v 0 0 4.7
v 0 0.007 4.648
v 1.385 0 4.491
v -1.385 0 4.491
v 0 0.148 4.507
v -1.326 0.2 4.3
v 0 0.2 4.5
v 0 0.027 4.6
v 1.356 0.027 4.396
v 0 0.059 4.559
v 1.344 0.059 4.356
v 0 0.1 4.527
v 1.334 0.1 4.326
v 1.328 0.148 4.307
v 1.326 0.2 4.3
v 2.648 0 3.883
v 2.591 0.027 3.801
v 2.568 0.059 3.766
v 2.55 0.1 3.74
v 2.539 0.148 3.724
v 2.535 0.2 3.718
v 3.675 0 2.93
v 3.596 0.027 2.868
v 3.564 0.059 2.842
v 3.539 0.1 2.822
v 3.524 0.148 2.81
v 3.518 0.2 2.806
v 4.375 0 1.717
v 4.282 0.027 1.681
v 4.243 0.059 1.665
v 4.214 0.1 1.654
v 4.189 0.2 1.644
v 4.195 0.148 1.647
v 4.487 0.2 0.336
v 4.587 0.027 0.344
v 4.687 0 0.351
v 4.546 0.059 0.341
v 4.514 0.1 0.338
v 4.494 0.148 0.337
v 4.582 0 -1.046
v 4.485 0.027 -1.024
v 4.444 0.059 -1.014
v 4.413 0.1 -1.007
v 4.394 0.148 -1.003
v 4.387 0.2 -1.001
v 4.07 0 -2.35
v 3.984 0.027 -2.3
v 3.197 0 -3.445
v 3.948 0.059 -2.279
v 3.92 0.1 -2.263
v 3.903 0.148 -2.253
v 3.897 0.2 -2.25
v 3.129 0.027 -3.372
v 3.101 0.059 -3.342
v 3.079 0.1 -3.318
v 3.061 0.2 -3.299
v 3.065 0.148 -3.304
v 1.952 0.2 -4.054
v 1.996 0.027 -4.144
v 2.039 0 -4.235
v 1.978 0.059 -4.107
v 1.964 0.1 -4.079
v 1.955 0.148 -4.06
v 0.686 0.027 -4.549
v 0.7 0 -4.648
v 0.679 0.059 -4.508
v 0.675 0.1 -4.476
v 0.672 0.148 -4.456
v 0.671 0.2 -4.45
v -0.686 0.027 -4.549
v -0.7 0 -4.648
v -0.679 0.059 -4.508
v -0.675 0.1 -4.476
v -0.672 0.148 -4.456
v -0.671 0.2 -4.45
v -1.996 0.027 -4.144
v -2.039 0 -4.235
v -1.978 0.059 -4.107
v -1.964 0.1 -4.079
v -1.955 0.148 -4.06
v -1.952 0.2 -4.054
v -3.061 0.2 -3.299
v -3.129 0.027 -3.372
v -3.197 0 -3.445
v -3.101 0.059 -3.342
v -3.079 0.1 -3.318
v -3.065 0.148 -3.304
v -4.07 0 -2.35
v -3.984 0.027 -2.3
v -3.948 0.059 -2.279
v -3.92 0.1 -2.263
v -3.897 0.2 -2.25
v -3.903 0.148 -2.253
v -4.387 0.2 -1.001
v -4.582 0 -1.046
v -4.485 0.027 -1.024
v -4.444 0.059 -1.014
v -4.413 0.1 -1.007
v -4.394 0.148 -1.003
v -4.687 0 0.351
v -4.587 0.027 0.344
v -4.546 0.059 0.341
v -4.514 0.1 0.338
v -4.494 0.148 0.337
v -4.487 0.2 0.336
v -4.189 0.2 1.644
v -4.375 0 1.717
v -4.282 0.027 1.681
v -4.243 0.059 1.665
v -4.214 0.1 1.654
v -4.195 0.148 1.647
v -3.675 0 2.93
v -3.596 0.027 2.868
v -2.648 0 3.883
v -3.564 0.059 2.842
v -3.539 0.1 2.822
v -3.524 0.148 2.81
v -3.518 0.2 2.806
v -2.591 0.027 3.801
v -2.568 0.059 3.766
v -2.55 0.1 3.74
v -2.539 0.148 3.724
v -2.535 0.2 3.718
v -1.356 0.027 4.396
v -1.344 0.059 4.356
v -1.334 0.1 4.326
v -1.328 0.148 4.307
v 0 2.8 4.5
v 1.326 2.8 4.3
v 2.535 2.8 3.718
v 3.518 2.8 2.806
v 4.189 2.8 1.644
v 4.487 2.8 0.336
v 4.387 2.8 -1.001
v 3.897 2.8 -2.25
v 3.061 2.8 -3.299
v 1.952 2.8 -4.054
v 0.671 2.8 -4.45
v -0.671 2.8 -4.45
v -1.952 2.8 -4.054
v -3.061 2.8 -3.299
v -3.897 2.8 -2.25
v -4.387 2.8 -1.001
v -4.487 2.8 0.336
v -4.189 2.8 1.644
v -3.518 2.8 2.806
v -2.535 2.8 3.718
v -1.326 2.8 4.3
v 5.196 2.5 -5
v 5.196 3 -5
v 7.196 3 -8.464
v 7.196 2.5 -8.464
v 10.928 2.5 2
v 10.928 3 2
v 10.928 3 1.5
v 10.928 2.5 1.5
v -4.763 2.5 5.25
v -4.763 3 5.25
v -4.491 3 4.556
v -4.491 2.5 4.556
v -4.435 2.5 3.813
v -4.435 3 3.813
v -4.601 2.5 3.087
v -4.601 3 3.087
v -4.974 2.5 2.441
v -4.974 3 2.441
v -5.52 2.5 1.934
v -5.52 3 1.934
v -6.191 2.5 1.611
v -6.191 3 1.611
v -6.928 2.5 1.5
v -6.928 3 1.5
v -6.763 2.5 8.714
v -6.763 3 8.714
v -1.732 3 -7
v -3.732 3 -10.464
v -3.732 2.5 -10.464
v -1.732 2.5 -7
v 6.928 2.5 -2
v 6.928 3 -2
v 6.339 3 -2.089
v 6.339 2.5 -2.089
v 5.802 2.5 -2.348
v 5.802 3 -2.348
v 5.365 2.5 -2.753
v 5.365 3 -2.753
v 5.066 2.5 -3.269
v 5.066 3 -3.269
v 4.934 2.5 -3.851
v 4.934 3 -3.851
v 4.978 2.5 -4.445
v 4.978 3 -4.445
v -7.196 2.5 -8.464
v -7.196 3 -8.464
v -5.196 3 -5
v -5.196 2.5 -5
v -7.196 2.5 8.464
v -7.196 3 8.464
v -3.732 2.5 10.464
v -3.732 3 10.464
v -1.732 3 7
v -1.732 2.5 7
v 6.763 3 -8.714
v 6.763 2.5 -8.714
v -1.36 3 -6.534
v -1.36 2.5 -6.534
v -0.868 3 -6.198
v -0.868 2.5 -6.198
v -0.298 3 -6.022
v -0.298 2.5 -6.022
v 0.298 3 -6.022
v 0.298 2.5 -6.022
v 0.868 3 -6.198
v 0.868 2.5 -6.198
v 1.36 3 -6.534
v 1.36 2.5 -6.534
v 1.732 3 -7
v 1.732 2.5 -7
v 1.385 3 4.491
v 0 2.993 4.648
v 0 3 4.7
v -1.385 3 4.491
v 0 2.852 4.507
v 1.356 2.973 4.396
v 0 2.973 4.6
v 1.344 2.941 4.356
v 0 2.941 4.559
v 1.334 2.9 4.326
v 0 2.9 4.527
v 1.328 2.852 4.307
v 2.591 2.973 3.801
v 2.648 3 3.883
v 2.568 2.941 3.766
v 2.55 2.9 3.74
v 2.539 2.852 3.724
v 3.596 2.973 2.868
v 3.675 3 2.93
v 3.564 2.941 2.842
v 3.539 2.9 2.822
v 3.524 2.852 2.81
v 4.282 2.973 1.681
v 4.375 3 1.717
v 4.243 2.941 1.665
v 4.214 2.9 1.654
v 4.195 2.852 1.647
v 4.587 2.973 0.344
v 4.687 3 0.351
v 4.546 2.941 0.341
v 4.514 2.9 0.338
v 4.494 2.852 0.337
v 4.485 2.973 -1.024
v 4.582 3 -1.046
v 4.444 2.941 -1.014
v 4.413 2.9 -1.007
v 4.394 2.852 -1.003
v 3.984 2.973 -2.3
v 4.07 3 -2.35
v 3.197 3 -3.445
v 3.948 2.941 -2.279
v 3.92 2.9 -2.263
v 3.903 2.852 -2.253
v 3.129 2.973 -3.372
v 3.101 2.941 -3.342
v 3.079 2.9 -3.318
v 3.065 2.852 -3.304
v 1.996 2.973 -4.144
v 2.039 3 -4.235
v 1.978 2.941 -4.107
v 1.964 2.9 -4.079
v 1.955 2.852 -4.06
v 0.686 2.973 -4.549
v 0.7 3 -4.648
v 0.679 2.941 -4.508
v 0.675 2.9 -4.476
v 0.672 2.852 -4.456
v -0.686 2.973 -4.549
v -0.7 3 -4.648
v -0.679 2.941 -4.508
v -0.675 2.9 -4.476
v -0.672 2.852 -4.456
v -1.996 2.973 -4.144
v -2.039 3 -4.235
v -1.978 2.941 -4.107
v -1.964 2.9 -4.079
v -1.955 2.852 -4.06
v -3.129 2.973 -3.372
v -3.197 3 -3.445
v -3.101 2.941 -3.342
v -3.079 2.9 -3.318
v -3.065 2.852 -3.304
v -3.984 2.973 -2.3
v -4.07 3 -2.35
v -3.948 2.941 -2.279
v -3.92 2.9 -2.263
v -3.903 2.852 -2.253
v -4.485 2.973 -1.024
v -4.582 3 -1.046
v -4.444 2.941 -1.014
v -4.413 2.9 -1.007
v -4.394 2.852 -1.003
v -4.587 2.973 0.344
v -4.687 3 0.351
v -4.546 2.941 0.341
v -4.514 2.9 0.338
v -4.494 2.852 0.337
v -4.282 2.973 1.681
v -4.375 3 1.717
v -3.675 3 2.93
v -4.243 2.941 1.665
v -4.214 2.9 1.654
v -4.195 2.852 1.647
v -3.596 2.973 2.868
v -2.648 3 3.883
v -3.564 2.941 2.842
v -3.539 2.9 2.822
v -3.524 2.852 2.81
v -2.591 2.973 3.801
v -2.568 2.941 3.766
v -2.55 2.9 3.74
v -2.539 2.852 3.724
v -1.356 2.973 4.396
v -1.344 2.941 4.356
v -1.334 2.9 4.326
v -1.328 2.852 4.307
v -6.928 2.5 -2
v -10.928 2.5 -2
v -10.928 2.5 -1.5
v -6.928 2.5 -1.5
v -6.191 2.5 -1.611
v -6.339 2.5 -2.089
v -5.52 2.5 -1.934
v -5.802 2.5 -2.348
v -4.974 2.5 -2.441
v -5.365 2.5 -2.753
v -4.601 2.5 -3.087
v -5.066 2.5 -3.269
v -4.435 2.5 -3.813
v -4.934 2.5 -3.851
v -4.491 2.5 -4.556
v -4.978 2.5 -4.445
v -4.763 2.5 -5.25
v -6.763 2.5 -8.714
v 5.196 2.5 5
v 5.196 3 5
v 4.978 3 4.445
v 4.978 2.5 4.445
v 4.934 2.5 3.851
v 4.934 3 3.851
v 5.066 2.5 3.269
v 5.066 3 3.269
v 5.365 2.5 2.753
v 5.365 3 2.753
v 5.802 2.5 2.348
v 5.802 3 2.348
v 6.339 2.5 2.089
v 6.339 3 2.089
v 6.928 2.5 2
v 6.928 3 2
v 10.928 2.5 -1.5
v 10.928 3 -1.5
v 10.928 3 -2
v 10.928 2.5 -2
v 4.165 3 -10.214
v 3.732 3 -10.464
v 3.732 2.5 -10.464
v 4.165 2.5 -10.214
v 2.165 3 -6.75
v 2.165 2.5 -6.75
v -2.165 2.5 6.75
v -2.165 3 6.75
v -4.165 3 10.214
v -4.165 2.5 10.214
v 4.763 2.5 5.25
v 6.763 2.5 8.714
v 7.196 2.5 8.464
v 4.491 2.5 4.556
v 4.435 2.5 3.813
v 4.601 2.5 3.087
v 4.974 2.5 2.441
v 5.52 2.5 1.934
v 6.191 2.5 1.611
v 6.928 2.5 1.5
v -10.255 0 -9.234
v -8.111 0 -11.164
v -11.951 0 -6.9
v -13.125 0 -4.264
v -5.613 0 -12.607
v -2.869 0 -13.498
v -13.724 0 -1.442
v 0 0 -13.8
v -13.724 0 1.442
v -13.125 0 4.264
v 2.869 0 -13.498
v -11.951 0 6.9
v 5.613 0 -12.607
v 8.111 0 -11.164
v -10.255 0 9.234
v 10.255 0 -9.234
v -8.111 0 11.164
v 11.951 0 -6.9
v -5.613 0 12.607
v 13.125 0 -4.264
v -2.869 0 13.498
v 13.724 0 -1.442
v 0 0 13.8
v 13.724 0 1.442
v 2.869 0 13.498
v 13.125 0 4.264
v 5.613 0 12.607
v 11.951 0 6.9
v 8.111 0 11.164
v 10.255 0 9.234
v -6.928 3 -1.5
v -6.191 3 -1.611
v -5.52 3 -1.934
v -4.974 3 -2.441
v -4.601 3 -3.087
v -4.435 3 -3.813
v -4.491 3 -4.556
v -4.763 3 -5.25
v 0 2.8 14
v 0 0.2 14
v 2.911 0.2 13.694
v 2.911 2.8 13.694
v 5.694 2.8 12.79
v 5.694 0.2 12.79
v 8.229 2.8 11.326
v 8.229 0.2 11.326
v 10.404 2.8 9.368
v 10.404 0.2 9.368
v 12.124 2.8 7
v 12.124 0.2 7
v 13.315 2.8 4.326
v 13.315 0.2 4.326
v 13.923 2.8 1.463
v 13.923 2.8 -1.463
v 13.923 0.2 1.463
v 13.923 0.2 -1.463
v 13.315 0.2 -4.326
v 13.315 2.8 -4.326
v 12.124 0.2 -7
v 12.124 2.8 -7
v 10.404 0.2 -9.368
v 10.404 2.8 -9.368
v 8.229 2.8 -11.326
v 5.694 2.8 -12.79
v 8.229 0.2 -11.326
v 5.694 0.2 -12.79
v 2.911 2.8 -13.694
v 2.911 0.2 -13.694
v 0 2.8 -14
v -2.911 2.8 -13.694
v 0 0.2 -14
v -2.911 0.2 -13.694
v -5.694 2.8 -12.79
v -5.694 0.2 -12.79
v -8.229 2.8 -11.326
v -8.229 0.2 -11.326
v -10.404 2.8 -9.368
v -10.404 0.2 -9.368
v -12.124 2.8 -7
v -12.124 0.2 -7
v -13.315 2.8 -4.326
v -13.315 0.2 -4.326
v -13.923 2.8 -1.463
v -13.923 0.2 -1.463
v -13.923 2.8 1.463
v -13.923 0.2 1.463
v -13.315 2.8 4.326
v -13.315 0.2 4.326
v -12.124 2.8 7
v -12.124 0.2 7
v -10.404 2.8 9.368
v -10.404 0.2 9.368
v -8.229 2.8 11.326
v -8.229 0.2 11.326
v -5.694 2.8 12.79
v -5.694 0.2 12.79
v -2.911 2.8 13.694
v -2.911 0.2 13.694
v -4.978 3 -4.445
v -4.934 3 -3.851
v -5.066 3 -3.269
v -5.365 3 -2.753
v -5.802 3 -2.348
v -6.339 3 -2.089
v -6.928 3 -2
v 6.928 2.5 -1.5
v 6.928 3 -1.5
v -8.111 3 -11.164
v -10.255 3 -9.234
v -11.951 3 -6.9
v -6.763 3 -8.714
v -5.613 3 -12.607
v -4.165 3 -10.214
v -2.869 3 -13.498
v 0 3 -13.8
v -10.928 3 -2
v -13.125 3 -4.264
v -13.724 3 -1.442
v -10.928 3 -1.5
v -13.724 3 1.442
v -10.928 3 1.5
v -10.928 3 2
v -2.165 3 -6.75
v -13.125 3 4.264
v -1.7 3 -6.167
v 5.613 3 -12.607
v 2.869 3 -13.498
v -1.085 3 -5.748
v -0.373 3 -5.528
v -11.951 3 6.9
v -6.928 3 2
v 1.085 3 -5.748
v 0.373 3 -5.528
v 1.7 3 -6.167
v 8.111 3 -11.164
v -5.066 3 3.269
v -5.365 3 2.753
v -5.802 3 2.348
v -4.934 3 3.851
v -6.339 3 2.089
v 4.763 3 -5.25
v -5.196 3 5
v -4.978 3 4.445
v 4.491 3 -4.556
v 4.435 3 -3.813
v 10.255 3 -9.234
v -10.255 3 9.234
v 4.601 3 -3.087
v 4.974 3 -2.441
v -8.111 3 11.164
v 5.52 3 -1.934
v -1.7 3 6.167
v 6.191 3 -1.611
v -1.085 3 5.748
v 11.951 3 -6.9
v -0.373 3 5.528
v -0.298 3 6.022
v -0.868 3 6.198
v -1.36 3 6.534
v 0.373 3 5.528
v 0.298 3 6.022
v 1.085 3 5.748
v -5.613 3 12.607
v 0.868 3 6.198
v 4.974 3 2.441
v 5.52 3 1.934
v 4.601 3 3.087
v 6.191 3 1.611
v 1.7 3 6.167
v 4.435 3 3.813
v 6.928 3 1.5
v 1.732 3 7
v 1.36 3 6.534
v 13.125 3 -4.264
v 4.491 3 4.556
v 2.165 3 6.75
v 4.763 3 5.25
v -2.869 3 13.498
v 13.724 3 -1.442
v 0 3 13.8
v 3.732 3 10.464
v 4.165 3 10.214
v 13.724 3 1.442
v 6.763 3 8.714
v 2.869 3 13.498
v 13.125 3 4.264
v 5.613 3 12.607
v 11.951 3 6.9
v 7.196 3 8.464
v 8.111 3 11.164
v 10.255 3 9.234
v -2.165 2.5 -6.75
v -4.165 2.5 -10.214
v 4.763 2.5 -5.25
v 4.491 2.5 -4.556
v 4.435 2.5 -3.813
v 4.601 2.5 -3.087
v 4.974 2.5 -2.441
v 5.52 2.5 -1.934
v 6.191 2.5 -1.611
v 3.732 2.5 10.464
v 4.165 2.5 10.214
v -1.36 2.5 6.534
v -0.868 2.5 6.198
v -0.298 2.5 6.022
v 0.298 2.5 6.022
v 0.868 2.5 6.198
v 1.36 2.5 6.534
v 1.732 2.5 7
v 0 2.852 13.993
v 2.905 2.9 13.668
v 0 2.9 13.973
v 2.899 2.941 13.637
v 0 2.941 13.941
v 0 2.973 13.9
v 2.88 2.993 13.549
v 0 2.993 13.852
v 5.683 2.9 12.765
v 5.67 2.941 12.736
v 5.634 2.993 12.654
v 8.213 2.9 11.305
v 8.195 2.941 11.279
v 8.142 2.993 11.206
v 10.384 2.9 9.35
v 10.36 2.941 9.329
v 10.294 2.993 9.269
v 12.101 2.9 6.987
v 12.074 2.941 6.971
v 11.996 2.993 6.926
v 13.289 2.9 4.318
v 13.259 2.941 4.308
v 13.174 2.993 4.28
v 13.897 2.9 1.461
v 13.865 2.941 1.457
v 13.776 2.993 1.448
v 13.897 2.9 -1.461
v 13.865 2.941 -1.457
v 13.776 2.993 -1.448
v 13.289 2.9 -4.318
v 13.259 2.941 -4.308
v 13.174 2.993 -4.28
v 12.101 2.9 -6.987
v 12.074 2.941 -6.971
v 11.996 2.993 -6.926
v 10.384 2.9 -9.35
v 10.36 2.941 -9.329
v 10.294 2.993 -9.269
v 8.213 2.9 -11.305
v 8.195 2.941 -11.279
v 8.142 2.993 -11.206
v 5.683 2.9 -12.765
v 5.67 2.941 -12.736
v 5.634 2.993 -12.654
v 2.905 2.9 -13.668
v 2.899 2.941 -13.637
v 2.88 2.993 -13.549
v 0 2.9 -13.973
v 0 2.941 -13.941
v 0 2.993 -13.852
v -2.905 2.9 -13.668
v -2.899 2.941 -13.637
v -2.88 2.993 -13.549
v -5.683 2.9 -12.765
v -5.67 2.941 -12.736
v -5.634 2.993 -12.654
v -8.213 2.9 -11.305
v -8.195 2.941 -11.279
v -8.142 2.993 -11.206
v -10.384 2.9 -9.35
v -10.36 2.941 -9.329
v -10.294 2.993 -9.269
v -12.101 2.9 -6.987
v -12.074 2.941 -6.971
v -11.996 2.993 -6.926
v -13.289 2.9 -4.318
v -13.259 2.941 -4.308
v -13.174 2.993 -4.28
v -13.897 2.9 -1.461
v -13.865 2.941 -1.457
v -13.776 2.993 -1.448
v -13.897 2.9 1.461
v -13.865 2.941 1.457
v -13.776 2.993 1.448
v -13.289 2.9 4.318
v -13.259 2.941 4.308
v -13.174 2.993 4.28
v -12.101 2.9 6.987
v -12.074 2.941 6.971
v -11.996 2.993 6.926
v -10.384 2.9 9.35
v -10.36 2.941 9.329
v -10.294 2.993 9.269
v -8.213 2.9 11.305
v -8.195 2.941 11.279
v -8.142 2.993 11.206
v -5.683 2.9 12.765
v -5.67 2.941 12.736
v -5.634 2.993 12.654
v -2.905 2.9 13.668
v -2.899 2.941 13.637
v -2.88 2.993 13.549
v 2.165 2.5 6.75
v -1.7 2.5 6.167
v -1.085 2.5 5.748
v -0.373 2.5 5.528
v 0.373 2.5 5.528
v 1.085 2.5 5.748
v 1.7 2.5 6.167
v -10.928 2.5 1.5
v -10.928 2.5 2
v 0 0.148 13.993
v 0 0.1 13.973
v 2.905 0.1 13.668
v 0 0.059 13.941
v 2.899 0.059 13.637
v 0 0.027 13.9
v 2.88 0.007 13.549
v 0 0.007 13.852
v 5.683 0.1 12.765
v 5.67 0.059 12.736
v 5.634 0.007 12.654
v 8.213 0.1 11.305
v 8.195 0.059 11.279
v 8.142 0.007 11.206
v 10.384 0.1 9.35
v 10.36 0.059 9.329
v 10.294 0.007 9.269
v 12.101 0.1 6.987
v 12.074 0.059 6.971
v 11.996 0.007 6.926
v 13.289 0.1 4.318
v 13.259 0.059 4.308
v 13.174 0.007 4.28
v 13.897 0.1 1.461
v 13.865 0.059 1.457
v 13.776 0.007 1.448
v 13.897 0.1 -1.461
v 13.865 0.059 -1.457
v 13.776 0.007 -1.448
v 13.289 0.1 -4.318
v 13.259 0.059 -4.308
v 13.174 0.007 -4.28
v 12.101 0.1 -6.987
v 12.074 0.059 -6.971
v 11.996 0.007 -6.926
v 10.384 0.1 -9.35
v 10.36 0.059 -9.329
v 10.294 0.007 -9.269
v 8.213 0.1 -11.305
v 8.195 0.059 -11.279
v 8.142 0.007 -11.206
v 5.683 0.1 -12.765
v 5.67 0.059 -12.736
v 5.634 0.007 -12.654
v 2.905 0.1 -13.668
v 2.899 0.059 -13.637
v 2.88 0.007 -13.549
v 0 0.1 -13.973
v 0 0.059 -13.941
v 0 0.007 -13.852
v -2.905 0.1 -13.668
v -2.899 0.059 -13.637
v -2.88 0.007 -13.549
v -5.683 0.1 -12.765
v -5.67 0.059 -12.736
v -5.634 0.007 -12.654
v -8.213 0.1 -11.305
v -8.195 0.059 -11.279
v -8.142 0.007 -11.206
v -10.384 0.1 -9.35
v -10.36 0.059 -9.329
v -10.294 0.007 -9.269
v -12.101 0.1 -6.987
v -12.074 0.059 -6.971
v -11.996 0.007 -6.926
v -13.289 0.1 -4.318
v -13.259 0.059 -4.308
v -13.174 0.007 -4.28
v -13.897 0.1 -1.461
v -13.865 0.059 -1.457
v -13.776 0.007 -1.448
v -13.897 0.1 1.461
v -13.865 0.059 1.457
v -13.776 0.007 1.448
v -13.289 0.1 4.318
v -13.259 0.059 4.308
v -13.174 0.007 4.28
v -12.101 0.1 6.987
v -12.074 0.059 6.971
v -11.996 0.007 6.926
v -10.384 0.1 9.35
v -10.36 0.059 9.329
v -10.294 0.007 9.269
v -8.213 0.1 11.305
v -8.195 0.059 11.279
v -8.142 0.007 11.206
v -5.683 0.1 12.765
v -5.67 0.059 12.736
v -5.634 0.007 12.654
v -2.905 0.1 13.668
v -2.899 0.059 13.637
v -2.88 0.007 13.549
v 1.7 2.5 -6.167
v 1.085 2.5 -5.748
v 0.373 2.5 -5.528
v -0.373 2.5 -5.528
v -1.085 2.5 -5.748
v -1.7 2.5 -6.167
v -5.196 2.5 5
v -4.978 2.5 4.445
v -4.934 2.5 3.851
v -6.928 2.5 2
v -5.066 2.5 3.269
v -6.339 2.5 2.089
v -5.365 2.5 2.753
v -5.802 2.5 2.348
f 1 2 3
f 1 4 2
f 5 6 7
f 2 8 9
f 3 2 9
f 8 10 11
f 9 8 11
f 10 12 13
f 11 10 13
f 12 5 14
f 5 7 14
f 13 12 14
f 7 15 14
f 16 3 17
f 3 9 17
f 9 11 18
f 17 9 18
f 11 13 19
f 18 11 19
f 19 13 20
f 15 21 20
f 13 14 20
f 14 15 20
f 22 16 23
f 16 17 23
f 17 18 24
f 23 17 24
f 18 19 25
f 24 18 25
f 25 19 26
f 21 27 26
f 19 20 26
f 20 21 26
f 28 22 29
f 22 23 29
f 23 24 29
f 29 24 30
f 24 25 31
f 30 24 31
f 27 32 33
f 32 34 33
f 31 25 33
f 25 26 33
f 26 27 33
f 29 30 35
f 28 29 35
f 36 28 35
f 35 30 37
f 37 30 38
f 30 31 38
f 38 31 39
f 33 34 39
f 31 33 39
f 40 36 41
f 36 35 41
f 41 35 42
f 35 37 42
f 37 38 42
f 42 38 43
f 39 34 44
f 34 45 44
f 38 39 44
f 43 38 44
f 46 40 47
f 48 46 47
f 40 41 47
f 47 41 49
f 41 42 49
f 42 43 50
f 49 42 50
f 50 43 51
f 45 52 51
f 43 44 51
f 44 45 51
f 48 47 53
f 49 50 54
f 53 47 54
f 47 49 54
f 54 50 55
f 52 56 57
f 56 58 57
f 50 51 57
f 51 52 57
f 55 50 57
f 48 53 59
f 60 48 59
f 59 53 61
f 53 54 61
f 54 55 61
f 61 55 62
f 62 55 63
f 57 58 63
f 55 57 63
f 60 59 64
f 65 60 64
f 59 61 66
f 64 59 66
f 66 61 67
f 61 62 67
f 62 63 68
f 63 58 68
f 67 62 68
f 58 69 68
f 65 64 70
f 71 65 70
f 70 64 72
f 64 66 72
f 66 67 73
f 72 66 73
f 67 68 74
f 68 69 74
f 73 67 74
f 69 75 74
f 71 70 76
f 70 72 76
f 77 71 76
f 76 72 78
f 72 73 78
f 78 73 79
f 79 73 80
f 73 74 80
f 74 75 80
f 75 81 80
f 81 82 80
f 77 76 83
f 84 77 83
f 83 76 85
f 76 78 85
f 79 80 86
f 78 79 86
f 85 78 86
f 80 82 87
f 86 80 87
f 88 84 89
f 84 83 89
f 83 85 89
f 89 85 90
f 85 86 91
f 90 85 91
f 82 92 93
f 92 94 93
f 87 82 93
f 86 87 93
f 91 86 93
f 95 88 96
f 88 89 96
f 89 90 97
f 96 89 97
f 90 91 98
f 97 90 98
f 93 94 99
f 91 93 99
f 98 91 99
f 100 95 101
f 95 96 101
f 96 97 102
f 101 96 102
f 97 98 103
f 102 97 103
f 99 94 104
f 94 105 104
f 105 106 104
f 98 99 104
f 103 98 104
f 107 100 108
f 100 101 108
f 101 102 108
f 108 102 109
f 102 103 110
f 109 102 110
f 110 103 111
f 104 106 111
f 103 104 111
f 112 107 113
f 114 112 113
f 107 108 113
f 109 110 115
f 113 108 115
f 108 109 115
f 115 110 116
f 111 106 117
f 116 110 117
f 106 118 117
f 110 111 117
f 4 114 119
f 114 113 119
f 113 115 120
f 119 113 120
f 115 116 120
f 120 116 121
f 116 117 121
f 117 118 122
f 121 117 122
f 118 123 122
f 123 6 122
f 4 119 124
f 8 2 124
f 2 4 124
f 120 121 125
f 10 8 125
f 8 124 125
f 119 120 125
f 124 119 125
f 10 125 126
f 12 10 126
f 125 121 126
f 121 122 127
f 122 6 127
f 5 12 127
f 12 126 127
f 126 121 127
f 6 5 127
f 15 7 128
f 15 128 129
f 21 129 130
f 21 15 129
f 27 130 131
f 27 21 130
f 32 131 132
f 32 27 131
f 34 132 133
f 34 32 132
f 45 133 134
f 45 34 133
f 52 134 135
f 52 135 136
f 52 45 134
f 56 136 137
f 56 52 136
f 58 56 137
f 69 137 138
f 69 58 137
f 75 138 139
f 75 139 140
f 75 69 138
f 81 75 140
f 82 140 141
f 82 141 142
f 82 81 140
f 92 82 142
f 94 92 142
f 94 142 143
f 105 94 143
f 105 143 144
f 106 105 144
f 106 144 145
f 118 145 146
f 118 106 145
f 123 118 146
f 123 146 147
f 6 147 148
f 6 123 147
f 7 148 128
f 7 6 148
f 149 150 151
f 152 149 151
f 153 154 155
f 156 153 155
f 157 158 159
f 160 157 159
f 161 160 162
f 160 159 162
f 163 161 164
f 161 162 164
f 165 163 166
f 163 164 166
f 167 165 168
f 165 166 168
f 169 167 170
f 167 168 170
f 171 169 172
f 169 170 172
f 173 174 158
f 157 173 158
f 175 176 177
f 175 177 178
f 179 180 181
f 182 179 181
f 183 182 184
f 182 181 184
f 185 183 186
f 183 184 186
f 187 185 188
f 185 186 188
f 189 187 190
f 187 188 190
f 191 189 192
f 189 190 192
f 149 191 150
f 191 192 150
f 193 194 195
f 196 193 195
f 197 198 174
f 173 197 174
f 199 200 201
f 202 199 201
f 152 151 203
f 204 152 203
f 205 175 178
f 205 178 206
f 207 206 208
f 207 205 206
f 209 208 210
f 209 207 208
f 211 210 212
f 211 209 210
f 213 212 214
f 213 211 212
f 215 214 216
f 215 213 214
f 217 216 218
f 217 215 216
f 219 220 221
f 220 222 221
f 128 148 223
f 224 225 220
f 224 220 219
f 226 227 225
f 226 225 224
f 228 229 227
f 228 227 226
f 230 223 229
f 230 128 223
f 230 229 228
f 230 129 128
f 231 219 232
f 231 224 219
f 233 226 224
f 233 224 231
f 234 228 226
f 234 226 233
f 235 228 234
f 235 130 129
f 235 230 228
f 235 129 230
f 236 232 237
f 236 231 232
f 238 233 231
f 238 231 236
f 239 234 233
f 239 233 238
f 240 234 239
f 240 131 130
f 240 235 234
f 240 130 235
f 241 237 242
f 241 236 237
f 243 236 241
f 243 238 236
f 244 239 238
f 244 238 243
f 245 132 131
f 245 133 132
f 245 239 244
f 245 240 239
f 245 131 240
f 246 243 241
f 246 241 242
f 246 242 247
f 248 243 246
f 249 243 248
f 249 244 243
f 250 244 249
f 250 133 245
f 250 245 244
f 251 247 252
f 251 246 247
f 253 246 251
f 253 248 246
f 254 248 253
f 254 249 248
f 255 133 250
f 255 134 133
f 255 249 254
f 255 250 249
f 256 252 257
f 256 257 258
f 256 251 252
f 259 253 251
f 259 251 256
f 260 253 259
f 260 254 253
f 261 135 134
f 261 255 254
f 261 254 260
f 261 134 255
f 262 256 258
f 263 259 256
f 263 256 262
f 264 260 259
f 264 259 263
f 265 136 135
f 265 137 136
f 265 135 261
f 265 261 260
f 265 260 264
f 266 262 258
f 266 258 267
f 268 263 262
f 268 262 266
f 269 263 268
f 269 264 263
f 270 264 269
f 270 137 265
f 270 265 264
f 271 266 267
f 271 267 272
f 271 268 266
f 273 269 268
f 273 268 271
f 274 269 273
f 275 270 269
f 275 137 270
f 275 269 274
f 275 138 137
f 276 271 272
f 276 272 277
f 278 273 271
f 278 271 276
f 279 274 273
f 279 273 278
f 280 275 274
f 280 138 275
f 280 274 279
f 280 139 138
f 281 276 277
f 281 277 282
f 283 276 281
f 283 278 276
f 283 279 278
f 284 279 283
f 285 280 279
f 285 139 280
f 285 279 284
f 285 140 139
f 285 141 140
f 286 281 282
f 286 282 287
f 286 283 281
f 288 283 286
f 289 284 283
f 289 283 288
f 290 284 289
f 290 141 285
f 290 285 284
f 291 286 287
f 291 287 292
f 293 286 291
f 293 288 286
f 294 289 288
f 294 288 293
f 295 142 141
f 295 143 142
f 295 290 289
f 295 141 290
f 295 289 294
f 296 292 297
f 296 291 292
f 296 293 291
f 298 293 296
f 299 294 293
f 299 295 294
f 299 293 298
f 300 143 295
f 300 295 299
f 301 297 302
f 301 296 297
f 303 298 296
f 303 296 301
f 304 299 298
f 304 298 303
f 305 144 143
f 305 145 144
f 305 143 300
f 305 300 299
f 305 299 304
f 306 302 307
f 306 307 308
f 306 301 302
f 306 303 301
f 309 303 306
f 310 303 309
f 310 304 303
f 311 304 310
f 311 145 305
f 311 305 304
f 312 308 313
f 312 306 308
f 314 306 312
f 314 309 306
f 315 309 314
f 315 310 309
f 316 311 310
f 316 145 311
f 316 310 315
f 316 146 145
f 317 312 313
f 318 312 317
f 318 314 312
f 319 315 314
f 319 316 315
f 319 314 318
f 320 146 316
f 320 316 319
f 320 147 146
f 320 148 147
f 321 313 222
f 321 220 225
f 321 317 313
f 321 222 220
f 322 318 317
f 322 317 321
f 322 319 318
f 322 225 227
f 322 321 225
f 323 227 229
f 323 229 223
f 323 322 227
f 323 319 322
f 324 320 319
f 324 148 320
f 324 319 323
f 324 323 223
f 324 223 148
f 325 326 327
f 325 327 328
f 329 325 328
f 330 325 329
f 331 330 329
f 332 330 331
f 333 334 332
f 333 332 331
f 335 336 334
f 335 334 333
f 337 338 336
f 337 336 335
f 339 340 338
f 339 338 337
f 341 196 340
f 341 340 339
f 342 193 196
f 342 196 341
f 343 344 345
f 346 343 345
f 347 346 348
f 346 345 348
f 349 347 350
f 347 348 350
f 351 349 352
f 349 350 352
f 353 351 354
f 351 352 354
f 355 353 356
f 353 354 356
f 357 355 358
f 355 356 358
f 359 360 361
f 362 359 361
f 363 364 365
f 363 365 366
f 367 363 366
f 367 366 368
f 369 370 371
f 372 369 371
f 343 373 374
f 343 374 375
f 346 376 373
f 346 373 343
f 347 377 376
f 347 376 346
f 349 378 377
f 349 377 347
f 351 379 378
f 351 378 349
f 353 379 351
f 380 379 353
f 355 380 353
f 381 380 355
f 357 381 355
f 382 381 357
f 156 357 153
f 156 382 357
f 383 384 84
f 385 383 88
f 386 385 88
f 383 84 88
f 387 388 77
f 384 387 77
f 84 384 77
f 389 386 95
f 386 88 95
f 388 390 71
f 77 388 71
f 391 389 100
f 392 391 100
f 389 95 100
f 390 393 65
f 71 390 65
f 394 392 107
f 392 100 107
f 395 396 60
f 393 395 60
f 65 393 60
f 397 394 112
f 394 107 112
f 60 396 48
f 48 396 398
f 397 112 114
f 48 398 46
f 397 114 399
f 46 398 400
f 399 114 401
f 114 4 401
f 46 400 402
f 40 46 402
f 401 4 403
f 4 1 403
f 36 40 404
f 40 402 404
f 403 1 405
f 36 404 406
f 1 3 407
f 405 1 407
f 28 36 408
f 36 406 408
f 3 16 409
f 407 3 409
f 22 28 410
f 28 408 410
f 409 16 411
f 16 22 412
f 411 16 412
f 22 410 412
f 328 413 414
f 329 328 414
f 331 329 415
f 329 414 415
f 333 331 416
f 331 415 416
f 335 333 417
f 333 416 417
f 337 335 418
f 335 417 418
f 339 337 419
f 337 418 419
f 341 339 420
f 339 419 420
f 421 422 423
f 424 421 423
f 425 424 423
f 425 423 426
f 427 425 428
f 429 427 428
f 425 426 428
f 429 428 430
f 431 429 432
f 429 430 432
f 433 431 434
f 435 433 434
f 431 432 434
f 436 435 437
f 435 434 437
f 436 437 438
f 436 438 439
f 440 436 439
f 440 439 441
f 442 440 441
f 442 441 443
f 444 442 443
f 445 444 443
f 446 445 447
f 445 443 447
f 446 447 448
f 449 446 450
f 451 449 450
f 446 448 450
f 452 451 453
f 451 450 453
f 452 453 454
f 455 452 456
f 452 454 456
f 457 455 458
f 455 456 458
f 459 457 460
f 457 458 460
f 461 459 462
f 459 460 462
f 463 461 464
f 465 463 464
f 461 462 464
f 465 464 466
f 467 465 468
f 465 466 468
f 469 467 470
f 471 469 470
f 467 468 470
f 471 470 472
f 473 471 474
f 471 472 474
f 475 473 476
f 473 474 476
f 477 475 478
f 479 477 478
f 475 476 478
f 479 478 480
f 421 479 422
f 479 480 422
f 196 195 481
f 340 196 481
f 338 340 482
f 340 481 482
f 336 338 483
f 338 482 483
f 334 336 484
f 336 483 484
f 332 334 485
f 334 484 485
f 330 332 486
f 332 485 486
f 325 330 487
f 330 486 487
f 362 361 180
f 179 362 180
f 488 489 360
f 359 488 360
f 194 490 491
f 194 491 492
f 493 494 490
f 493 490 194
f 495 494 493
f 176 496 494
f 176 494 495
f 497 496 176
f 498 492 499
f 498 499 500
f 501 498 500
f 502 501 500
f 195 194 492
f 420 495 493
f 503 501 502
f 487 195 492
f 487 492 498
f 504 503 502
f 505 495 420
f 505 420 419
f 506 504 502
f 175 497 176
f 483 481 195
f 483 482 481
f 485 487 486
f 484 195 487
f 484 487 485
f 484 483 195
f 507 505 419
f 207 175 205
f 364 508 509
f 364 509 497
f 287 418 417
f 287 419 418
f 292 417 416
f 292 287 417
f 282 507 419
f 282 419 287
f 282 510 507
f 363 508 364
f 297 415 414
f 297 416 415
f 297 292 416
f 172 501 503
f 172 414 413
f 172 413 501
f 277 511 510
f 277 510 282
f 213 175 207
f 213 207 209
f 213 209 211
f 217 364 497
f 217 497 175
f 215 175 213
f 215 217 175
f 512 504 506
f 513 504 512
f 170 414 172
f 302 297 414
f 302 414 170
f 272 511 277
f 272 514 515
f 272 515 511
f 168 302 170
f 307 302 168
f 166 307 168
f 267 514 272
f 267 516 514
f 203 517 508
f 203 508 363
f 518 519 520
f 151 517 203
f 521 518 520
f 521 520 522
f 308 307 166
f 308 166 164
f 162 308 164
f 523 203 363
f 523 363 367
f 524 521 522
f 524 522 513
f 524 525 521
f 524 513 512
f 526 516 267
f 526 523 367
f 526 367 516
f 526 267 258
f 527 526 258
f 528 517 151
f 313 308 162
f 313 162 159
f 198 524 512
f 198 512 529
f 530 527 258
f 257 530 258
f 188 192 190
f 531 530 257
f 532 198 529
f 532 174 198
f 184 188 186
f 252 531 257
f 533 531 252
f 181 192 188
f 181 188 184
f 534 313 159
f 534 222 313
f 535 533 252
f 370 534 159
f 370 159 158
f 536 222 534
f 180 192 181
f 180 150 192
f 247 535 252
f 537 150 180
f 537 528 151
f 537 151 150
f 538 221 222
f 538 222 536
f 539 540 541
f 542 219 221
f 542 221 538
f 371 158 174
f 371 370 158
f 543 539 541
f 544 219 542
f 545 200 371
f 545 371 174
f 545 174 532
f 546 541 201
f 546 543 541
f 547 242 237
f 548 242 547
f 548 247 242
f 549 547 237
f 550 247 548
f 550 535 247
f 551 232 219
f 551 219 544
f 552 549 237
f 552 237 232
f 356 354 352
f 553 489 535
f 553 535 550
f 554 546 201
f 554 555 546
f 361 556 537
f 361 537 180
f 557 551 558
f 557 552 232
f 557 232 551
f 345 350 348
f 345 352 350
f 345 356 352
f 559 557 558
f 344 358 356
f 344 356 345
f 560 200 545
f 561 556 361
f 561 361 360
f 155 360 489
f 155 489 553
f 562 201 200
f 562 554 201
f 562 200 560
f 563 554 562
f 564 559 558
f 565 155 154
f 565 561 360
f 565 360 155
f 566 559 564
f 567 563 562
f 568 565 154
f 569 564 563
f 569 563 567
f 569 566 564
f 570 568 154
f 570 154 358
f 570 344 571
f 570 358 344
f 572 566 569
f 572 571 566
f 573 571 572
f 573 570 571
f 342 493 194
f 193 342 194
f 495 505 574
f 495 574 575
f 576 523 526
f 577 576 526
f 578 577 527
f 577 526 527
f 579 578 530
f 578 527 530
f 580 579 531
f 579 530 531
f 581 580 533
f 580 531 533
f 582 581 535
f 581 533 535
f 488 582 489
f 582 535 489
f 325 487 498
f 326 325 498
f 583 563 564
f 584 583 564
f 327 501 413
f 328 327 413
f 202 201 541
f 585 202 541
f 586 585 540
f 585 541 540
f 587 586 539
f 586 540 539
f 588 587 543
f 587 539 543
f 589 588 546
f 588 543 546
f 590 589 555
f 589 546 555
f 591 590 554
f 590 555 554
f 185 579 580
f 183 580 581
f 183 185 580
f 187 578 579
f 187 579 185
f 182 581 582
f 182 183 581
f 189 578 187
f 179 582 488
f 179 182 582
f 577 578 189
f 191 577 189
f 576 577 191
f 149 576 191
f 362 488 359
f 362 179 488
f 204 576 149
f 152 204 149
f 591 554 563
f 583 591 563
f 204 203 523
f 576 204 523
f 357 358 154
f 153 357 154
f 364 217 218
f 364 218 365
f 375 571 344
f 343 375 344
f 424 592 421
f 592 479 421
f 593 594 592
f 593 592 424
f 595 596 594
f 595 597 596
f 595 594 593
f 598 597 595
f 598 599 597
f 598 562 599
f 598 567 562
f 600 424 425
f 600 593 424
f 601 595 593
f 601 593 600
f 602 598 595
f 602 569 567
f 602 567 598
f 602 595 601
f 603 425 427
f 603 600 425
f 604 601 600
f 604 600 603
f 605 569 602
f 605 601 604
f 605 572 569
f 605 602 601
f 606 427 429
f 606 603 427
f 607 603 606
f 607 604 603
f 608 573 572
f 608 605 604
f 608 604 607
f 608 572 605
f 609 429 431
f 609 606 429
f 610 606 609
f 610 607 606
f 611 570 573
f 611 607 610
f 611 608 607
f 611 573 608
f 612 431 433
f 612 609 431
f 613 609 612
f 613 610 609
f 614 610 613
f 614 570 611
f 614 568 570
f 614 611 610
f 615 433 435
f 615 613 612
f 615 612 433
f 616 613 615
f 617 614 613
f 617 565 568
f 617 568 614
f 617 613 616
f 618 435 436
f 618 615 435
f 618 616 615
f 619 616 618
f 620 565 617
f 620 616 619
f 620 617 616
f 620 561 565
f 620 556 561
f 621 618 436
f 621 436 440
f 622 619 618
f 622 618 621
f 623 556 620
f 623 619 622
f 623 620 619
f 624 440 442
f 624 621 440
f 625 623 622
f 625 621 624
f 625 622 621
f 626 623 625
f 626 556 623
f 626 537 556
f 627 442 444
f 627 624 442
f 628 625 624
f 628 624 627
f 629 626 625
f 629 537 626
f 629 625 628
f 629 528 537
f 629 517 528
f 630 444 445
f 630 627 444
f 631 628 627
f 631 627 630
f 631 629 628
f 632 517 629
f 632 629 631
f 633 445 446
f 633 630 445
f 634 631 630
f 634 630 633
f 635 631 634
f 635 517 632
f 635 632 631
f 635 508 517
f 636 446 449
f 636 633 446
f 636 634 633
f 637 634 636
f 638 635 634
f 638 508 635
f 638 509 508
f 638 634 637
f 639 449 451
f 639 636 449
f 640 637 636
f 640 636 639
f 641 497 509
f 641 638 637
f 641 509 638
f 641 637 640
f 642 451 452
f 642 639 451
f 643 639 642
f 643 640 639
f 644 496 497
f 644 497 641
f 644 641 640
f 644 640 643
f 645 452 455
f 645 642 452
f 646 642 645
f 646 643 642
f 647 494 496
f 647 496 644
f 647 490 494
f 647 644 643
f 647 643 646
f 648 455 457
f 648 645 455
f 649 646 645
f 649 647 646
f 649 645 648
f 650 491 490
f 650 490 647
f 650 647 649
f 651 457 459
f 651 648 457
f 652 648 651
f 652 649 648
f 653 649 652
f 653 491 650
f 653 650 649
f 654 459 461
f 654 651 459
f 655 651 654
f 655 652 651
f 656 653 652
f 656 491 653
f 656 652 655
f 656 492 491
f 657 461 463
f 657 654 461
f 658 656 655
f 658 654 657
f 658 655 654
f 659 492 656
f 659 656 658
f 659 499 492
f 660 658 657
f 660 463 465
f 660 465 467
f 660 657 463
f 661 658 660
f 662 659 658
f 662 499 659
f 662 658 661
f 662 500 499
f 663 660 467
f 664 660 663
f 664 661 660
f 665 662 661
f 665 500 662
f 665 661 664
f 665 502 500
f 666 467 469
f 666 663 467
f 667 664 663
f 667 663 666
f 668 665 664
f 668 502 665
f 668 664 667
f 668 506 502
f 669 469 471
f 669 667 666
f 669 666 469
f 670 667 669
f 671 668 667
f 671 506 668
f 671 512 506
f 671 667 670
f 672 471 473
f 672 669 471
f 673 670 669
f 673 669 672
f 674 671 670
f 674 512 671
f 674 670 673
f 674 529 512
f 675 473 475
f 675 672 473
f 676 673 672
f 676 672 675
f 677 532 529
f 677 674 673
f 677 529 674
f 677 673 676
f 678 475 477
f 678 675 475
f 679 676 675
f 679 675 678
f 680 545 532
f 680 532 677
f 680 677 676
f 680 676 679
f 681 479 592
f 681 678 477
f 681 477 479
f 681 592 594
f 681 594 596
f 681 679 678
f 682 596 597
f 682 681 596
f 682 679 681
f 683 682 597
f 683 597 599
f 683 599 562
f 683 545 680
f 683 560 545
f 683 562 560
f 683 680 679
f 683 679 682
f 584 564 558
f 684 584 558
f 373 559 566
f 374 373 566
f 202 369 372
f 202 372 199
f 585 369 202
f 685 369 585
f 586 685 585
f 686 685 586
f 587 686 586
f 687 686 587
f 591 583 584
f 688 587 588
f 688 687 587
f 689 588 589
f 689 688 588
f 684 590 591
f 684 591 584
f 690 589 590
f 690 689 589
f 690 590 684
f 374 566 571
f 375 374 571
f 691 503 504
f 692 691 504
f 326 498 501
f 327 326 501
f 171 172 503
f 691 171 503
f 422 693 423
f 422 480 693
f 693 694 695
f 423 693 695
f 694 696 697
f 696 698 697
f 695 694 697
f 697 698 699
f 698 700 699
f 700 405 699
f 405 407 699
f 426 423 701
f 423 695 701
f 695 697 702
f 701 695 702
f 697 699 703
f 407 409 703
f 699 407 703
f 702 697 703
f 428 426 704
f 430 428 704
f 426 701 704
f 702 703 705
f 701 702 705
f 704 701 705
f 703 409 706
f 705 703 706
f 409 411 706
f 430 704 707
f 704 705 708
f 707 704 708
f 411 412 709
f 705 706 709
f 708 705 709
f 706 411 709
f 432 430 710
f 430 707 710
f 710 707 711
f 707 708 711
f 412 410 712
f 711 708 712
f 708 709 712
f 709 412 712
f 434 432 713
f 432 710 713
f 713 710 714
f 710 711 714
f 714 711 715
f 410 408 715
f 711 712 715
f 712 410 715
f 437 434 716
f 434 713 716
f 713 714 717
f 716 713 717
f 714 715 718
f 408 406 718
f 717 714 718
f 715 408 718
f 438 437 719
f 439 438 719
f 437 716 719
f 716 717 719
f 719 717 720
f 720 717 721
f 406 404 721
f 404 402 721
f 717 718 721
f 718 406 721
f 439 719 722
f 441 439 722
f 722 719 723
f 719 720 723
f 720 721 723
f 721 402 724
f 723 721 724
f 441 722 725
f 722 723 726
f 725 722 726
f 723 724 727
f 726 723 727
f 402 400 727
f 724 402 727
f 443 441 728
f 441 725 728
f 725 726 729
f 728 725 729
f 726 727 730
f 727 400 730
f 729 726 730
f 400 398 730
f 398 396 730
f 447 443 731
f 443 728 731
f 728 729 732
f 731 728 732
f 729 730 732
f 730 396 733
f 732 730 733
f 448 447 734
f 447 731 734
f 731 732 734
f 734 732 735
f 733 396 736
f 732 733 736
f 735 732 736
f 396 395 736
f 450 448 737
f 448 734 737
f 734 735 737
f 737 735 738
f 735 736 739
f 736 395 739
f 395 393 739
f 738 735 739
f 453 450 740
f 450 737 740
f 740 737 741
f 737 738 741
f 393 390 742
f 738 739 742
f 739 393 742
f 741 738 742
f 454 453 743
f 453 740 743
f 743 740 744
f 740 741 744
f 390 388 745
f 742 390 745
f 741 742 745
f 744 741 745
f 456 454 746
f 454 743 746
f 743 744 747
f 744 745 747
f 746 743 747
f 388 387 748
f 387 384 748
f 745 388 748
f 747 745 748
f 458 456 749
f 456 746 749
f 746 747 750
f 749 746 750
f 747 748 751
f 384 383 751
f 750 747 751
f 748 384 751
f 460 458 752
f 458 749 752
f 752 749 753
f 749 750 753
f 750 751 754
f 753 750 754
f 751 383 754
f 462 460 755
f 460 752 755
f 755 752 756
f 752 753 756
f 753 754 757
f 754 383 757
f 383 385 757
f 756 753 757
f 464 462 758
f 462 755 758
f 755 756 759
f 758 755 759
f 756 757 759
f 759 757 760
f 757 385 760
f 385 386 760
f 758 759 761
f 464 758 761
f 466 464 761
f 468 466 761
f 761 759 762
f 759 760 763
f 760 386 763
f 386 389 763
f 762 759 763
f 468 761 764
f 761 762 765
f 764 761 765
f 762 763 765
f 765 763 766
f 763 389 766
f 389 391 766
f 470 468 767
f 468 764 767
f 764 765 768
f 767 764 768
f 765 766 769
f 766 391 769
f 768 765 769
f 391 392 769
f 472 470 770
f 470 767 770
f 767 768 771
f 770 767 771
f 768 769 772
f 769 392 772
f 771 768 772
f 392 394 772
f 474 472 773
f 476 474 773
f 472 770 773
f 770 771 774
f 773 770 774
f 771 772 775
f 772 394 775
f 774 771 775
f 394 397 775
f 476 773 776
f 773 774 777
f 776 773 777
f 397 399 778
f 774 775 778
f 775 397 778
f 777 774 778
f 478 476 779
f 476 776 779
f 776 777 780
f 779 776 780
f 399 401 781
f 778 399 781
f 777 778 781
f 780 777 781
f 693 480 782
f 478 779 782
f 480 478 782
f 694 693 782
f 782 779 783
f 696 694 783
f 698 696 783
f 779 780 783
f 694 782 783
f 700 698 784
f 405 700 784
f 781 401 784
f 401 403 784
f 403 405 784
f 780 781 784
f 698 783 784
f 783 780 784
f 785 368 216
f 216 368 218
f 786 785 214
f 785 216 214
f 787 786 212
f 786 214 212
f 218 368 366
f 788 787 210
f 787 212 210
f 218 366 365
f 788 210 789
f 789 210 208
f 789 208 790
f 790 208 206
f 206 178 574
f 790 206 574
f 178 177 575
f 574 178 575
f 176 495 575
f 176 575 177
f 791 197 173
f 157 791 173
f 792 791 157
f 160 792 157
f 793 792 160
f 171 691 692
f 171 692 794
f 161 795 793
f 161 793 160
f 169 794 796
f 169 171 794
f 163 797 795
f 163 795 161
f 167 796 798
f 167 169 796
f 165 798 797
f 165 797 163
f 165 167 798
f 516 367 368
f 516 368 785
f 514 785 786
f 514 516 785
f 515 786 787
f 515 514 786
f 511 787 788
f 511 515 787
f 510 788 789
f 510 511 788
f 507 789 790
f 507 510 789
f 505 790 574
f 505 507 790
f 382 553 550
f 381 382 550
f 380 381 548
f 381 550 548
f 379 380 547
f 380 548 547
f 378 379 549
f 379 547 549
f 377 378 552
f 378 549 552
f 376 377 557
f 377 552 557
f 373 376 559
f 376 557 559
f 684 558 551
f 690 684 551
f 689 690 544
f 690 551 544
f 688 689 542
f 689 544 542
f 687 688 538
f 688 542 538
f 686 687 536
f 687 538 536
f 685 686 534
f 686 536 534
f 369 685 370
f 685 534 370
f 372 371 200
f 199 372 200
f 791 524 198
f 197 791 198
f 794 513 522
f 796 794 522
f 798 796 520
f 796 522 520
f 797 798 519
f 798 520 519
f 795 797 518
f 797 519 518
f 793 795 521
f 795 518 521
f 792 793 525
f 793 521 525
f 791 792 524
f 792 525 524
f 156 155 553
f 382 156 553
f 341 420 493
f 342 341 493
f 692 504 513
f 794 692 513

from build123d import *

# Parameters (mm, degrees)
SKETCH1_R           = 14
SKETCH1_R_2         = 4.5
BOSS_EXTRUDE1_DEPTH = 3
CUT_EXTRUDE1_DEPTH  = 0.5
FILLET1_R           = 0.2


with BuildPart() as part:
    # Sketch1 → Boss-Extrude1 (new body)
    with BuildSketch(Plane(origin=(0, 0, 0), x_dir=(1, 0, 0), z_dir=(0, 1, 0))):
        with Locations(Location((0, 0, 0), (0, 0, 270))):
            Circle(SKETCH1_R)
        with Locations(Location((0, 0, 0), (0, 0, 270))):
            Circle(SKETCH1_R_2, mode=Mode.SUBTRACT)
    extrude(amount=BOSS_EXTRUDE1_DEPTH)

    # Sketch2 → Cut-Extrude1 (cut)
    with BuildSketch(Plane(origin=(0, 3, 0), x_dir=(1, 0, 0), z_dir=(0, 1, 0))):
        with BuildLine():
            Line((-2.165063509, 6.75), (-4.165063509, 10.214101615))
            Line((-4.165063509, 10.214101615), (-3.732050808, 10.464101615))
            Line((-3.732050808, 10.464101615), (-1.732050808, 7))
            ThreePointArc((-1.732050808, 7), (0, 6), (1.732050808, 7))
            Line((1.732050808, 7), (3.732050808, 10.464101615))
            Line((3.732050808, 10.464101615), (4.165063509, 10.214101615))
            Line((4.165063509, 10.214101615), (2.165063509, 6.75))
            ThreePointArc((2.165063509, 6.75), (0, 5.5), (-2.165063509, 6.75))
        make_face()
        with BuildLine():
            Line((5.196152423, 5), (7.196152423, 8.464101615))
            Line((7.196152423, 8.464101615), (6.763139721, 8.714101615))
            Line((6.763139721, 8.714101615), (4.763139721, 5.25))
            ThreePointArc((4.763139721, 5.25), (4.763139721, 2.75), (6.92820323, 1.5))
            Line((6.92820323, 1.5), (10.92820323, 1.5))
            Line((10.92820323, 1.5), (10.92820323, 2))
            Line((10.92820323, 2), (6.92820323, 2))
            ThreePointArc((6.92820323, 2), (5.196152423, 3), (5.196152423, 5))
        make_face()
        with BuildLine():
            Line((6.92820323, -2), (10.92820323, -2))
            Line((10.92820323, -2), (10.92820323, -1.5))
            Line((10.92820323, -1.5), (6.92820323, -1.5))
            ThreePointArc((6.92820323, -1.5), (4.763139721, -2.75), (4.763139721, -5.25))
            Line((4.763139721, -5.25), (6.763139721, -8.714101615))
            Line((6.763139721, -8.714101615), (7.196152423, -8.464101615))
            Line((7.196152423, -8.464101615), (5.196152423, -5))
            ThreePointArc((5.196152423, -5), (5.196152423, -3), (6.92820323, -2))
        make_face()
        with BuildLine():
            Line((1.732050808, -7), (3.732050808, -10.464101615))
            Line((3.732050808, -10.464101615), (4.165063509, -10.214101615))
            Line((4.165063509, -10.214101615), (2.165063509, -6.75))
            ThreePointArc((2.165063509, -6.75), (0, -5.5), (-2.165063509, -6.75))
            Line((-2.165063509, -6.75), (-4.165063509, -10.214101615))
            Line((-4.165063509, -10.214101615), (-3.732050808, -10.464101615))
            Line((-3.732050808, -10.464101615), (-1.732050808, -7))
            ThreePointArc((-1.732050808, -7), (0, -6), (1.732050808, -7))
        make_face()
        with BuildLine():
            Line((-5.196152423, -5), (-7.196152423, -8.464101615))
            Line((-7.196152423, -8.464101615), (-6.763139721, -8.714101615))
            Line((-6.763139721, -8.714101615), (-4.763139721, -5.25))
            ThreePointArc((-4.763139721, -5.25), (-4.763139721, -2.75), (-6.92820323, -1.5))
            Line((-6.92820323, -1.5), (-10.92820323, -1.5))
            Line((-10.92820323, -1.5), (-10.92820323, -2))
            Line((-10.92820323, -2), (-6.92820323, -2))
            ThreePointArc((-6.92820323, -2), (-5.196152423, -3), (-5.196152423, -5))
        make_face()
        with BuildLine():
            Line((-6.92820323, 2), (-10.92820323, 2))
            Line((-10.92820323, 2), (-10.92820323, 1.5))
            Line((-10.92820323, 1.5), (-6.92820323, 1.5))
            ThreePointArc((-6.92820323, 1.5), (-4.763139721, 2.75), (-4.763139721, 5.25))
            Line((-4.763139721, 5.25), (-6.763139721, 8.714101615))
            Line((-6.763139721, 8.714101615), (-7.196152423, 8.464101615))
            Line((-7.196152423, 8.464101615), (-5.196152423, 5))
            ThreePointArc((-5.196152423, 5), (-5.196152423, 3), (-6.92820323, 2))
        make_face()
    extrude(amount=-CUT_EXTRUDE1_DEPTH, mode=Mode.SUBTRACT)

    # Fillet1
    fillet1_edges = [part.edges().sort_by_distance(p)[0] for p in [
        (0, 0, -14),
        (0, 3, -14),
        (0, 0, -4.5),
        (0, 3, -4.5),
    ]]
    fillet(fillet1_edges, radius=FILLET1_R)


solid = part.part
